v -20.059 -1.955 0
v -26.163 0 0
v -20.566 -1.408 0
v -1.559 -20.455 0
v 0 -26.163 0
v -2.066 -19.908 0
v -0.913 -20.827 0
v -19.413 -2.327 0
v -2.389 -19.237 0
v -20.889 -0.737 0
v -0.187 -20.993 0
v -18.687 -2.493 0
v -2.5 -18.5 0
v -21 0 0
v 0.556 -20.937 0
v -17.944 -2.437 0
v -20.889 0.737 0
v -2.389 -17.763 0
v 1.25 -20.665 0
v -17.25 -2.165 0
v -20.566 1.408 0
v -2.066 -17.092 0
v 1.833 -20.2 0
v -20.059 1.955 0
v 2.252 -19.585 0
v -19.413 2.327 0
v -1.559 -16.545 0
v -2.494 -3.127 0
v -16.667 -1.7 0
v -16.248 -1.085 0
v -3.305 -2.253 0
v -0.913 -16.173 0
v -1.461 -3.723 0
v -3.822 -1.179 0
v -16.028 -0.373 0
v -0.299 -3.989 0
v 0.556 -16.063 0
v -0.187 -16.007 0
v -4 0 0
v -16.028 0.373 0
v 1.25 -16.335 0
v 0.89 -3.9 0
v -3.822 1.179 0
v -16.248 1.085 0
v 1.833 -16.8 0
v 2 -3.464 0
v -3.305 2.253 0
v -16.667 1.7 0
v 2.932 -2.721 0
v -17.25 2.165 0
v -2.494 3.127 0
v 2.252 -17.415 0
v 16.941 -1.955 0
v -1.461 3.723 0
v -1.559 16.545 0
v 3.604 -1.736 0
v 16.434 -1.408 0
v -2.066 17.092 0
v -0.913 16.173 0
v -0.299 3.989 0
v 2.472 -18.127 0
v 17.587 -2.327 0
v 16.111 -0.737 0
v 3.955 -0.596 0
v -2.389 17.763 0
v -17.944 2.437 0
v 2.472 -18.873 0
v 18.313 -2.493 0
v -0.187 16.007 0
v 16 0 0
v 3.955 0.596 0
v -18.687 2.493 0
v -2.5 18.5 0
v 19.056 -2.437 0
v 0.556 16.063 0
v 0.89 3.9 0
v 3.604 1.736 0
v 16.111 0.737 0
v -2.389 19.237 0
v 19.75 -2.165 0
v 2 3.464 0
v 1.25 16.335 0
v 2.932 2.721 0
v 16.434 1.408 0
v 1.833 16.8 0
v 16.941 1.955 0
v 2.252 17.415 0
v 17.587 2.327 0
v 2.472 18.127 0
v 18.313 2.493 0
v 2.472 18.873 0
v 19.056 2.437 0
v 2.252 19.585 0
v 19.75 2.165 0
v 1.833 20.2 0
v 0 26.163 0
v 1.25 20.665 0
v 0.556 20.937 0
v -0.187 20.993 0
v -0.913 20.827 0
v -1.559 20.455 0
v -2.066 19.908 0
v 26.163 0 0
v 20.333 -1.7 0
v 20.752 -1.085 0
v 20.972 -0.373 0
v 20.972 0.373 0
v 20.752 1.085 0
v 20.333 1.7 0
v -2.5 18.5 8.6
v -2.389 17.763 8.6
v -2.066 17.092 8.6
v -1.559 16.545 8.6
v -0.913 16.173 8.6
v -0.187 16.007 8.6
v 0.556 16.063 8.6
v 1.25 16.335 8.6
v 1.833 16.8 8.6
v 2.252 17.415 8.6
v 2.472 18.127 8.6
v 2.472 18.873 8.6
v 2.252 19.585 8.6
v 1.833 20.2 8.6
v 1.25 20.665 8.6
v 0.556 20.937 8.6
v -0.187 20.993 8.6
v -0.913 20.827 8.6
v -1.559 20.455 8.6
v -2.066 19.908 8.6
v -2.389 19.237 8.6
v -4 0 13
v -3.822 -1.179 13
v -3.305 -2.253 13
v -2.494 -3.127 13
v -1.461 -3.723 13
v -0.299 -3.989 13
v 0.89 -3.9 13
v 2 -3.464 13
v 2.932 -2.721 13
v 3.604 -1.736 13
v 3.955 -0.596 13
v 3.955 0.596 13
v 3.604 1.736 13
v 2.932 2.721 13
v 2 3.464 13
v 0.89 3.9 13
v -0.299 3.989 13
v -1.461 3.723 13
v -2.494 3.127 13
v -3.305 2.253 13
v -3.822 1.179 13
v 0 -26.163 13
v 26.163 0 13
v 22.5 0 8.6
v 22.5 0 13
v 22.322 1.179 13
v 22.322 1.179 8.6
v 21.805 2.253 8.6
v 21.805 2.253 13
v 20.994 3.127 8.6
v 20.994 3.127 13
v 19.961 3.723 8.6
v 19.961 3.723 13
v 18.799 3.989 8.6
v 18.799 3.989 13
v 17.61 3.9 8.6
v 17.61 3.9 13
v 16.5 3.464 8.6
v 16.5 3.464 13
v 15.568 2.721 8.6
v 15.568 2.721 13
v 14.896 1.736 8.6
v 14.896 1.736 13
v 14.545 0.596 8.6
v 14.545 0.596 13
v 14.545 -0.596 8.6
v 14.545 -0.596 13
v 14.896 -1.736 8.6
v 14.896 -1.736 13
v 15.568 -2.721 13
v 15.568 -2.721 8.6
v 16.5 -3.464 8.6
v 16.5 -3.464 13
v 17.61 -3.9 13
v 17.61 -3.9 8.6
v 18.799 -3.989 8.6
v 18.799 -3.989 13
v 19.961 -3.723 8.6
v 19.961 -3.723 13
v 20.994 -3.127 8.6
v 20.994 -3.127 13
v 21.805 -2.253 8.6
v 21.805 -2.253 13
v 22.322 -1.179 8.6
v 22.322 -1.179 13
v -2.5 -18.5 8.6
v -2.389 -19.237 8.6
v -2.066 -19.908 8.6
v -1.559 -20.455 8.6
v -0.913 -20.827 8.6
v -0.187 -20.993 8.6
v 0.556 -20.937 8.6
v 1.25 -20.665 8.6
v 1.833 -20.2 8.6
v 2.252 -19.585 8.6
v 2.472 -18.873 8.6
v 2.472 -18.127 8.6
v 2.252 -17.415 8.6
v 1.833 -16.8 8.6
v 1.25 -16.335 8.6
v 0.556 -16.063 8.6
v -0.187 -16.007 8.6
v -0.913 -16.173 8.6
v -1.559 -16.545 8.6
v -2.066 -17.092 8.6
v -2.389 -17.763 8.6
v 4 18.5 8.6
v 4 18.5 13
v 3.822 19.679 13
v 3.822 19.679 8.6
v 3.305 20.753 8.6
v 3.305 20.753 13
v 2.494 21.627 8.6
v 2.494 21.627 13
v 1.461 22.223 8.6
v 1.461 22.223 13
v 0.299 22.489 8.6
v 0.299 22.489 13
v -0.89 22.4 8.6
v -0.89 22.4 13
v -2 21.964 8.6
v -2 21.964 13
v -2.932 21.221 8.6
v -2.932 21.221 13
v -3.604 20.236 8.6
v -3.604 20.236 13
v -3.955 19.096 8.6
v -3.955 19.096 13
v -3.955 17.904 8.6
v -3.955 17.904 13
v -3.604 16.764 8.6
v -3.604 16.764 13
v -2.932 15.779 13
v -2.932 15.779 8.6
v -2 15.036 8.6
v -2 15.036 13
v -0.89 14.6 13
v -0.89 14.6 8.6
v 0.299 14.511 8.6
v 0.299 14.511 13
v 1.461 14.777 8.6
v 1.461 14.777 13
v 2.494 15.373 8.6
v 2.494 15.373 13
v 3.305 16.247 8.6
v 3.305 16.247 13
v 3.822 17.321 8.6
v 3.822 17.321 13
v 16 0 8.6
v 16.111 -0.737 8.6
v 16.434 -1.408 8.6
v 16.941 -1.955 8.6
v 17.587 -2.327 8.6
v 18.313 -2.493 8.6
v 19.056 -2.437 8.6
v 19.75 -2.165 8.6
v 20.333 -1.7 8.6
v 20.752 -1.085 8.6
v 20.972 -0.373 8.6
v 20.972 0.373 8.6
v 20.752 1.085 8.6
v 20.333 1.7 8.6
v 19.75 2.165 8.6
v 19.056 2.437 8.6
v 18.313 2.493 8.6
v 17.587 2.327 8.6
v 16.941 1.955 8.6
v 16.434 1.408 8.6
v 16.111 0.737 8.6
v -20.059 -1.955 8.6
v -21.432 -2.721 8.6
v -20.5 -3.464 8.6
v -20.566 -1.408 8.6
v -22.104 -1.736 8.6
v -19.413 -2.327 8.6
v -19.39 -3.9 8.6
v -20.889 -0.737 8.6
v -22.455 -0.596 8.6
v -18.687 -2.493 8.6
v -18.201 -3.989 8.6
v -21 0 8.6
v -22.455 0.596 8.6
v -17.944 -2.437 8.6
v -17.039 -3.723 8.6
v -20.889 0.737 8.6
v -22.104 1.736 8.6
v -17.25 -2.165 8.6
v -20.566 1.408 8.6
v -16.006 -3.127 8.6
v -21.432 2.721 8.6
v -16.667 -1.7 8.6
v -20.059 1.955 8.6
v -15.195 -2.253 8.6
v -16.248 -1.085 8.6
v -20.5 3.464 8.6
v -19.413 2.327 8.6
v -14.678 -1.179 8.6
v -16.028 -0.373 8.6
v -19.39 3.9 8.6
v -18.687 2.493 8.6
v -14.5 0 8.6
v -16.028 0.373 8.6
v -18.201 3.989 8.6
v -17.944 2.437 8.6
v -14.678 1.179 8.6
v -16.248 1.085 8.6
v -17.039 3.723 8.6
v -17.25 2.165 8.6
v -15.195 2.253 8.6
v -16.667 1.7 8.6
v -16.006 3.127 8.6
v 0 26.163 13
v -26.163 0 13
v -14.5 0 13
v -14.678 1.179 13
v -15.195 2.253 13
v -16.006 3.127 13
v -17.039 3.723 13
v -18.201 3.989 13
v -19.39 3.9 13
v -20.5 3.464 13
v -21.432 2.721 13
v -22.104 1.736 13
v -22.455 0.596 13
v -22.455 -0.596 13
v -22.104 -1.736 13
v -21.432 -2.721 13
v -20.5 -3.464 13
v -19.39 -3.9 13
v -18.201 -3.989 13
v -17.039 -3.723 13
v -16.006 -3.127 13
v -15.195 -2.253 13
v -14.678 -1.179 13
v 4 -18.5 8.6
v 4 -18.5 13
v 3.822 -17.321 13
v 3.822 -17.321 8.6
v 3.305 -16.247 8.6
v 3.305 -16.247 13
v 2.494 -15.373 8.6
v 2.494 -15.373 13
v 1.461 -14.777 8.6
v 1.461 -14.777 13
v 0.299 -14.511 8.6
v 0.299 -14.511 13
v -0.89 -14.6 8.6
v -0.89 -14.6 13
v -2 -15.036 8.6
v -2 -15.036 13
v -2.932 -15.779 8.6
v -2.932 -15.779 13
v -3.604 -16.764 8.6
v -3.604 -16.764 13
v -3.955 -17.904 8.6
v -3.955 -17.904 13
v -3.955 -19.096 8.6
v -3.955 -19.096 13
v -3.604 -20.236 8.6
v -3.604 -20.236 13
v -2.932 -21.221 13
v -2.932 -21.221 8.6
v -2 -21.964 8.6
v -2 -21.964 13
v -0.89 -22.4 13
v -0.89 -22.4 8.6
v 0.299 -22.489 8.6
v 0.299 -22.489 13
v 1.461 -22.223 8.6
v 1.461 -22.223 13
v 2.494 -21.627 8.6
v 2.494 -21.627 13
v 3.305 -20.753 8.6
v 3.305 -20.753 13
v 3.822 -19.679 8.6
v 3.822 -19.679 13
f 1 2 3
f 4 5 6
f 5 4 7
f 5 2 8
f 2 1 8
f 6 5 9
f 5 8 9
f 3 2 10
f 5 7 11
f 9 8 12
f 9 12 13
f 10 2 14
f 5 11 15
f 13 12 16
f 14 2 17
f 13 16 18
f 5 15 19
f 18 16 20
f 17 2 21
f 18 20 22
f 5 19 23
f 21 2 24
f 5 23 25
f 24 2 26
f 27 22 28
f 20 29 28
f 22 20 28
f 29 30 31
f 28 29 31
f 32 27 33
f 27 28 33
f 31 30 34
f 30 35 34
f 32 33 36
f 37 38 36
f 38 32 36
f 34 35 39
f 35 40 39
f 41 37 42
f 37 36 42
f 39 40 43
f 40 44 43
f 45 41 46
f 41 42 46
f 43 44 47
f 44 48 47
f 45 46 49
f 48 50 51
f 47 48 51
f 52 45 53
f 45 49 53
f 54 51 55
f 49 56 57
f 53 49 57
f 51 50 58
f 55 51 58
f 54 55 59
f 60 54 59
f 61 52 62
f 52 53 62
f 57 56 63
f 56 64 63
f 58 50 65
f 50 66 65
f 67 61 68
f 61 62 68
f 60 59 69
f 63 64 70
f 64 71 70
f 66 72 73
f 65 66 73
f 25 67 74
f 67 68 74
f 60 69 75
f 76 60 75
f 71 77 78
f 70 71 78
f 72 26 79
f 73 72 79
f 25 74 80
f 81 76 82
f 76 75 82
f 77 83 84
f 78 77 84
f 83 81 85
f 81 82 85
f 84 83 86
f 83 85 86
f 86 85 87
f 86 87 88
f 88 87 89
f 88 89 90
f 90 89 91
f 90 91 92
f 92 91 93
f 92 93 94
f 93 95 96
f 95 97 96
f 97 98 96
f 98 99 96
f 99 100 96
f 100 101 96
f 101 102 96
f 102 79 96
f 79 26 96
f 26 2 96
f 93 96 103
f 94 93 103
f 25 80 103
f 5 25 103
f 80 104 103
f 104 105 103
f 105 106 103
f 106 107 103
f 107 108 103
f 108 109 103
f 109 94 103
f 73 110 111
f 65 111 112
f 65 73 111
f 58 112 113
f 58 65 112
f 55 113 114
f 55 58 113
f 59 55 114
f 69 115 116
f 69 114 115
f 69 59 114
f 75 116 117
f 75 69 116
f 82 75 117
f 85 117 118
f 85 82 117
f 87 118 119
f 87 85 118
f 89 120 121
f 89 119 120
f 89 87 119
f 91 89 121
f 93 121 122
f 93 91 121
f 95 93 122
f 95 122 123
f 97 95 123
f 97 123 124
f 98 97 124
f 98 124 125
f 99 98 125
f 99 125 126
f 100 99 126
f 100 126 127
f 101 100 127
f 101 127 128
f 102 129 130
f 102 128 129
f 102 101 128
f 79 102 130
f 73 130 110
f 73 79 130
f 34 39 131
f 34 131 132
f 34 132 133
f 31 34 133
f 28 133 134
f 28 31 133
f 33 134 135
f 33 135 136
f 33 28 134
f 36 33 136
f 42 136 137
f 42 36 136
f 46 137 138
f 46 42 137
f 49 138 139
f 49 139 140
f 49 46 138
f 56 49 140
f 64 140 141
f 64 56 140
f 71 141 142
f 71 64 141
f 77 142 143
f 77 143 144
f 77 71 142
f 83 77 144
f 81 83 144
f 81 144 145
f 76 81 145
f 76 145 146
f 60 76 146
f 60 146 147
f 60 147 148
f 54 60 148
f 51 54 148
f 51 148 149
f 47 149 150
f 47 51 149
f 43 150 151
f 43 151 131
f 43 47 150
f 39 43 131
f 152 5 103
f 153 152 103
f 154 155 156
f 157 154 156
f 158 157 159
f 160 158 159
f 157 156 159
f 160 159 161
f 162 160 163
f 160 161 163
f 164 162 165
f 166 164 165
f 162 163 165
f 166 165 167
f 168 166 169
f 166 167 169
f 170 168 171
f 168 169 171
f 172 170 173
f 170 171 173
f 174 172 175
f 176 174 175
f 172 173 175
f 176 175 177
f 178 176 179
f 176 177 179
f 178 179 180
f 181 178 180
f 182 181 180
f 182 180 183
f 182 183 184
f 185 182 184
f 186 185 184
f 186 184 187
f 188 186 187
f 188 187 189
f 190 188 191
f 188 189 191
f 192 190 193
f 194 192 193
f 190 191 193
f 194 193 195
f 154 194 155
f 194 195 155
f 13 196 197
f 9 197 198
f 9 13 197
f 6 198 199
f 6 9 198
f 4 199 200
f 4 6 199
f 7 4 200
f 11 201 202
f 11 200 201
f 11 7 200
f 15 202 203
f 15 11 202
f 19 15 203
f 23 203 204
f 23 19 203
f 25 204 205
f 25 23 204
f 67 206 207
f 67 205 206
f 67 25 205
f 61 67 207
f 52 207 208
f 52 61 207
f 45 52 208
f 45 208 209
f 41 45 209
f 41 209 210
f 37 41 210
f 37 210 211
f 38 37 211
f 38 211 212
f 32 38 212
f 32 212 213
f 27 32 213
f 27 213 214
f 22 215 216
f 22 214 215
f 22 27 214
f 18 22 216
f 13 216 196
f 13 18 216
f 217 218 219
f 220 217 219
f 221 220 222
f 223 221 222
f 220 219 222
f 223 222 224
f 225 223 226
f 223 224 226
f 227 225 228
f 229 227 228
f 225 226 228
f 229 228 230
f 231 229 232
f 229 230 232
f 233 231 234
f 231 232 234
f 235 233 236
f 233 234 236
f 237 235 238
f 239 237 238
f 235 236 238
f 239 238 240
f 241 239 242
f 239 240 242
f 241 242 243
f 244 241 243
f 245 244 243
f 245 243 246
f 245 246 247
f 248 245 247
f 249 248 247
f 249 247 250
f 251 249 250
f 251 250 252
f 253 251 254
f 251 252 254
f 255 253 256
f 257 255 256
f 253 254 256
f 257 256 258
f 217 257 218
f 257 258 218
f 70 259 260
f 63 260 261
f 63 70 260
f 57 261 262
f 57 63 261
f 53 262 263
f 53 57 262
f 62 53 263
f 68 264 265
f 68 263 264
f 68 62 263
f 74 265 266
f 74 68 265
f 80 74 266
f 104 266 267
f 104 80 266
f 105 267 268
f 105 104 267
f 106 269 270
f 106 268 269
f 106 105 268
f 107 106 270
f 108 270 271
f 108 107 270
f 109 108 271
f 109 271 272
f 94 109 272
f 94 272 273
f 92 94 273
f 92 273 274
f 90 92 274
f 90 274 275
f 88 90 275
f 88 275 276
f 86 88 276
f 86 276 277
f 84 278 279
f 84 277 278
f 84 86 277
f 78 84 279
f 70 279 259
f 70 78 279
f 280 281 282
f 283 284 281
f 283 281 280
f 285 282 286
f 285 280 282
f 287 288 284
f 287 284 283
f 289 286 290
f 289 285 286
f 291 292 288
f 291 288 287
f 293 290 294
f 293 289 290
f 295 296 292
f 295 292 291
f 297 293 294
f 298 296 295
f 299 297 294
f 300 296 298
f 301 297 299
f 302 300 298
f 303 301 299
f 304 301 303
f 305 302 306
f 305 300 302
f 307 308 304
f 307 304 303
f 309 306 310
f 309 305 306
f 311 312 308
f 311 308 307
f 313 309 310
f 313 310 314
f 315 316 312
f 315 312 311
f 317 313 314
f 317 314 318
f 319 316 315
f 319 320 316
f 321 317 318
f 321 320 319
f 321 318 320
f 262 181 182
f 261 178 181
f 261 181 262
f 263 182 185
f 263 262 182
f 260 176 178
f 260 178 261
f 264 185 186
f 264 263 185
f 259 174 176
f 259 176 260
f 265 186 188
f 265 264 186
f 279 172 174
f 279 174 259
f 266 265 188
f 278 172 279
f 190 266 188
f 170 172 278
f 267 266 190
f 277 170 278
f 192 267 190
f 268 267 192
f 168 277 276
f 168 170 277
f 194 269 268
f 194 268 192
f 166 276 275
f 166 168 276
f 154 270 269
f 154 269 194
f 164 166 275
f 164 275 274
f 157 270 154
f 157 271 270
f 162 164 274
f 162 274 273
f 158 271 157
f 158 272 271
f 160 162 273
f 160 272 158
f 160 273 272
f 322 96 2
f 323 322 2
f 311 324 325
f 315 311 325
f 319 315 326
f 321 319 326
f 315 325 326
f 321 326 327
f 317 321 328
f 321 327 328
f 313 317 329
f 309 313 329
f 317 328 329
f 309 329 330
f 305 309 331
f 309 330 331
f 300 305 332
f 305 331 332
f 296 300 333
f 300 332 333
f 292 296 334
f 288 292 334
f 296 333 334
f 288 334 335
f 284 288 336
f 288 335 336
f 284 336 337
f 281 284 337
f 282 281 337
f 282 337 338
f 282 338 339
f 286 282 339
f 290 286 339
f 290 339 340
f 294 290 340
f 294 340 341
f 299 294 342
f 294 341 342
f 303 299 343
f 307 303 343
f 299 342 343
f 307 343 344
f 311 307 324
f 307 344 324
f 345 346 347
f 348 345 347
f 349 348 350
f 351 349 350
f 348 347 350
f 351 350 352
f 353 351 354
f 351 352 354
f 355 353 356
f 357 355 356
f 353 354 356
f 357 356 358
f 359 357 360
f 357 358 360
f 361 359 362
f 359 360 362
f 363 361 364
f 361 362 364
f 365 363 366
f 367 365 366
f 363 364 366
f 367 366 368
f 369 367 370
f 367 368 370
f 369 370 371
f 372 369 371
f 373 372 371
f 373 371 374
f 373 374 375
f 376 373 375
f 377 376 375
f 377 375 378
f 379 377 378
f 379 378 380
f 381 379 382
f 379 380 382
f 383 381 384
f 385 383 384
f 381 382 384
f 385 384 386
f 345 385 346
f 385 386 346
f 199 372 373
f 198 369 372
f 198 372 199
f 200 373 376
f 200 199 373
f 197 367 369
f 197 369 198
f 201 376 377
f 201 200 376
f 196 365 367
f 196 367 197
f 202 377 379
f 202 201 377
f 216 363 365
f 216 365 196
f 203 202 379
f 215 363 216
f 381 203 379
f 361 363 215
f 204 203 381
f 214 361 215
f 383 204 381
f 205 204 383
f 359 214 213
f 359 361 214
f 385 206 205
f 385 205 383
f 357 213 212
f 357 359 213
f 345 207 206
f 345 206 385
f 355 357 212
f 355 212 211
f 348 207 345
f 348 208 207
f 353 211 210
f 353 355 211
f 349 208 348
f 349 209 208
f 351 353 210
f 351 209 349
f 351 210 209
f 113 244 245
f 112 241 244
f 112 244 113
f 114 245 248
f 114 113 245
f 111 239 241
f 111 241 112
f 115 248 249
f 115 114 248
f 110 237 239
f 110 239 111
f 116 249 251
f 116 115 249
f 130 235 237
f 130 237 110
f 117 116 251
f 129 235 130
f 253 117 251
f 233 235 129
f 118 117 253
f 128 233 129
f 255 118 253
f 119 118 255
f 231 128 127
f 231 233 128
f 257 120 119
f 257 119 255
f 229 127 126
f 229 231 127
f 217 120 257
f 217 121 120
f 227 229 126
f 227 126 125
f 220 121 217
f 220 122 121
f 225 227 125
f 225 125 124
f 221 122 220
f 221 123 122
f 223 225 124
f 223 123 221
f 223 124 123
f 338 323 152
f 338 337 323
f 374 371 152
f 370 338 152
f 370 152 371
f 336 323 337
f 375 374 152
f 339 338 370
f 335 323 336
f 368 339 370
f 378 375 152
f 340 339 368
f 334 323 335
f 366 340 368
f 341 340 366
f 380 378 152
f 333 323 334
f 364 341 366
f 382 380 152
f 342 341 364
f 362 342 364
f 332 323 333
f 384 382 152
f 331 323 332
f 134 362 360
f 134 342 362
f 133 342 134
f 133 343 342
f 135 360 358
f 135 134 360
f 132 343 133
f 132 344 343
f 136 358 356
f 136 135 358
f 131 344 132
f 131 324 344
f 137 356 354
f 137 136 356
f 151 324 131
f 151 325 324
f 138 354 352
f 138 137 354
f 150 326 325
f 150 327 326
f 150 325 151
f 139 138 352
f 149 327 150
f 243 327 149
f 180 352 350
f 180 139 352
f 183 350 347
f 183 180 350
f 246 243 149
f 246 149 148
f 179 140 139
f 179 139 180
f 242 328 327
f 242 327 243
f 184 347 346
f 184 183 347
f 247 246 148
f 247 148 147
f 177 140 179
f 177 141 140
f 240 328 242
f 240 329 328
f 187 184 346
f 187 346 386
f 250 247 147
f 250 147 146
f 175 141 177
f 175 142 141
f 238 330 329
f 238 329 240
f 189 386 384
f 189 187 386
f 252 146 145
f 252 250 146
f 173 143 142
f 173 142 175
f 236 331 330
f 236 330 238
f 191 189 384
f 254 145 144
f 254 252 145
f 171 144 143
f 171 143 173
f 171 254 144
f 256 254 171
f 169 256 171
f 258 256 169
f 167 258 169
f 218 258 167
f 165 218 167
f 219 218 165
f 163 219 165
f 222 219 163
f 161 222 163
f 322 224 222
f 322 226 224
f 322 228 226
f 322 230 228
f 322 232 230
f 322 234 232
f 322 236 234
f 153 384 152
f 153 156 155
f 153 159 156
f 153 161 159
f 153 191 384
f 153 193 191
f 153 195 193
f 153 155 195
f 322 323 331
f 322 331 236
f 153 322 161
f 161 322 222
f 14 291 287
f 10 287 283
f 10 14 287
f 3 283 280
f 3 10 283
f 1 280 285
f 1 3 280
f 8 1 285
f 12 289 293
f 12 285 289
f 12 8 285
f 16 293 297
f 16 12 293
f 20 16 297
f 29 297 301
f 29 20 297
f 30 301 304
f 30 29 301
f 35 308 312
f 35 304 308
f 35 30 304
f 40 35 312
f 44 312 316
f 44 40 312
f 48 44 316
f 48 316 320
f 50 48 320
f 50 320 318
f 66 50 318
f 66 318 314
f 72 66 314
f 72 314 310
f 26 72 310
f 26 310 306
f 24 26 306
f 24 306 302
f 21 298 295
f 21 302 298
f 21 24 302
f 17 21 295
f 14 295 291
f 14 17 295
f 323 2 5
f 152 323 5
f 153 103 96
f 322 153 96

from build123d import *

# Parameters (mm, degrees)
SKETCH_1_R          = 2.5
SKETCH_1_R_2        = 4
EXTRUDE_1_DEPTH     = 13
SKETCH_2_R          = 4
CUT_EXTRUDE_1_DEPTH = 4.4


with BuildPart() as part:
    # 草图1 → 凸台-拉伸1 (new body)
    with BuildSketch(Plane.XY):
        Polygon((0, 26.162950904), (-26.162950904, 0), (0, -26.162950904), (26.162950904, 0), align=None)
        with Locations(Location((18.5, 0, 0), (0, 0, 180))):
            Circle(SKETCH_1_R, mode=Mode.SUBTRACT)
        with Locations(Location((0, -18.5, 0), (0, 0, 180))):
            Circle(SKETCH_1_R, mode=Mode.SUBTRACT)
        with Locations(Location((-18.5, 0, 0), (0, 0, 180))):
            Circle(SKETCH_1_R, mode=Mode.SUBTRACT)
        with Locations(Location((0, 18.5, 0), (0, 0, 180))):
            Circle(SKETCH_1_R, mode=Mode.SUBTRACT)
        with Locations(Location((0, 0, 0), (0, 0, 180))):
            Circle(SKETCH_1_R_2, mode=Mode.SUBTRACT)
    extrude(amount=EXTRUDE_1_DEPTH)

    # 草图2 → 切除-拉伸1 (cut)
    with BuildSketch(Plane.XY.offset(13)):
        with Locations((18.5, 0)):
            Circle(SKETCH_2_R)
        with Locations((0, -18.5)):
            Circle(SKETCH_2_R)
        with Locations((-18.5, 0)):
            Circle(SKETCH_2_R)
        with Locations((0, 18.5)):
            Circle(SKETCH_2_R)
    extrude(amount=-CUT_EXTRUDE_1_DEPTH, mode=Mode.SUBTRACT)


solid = part.part
